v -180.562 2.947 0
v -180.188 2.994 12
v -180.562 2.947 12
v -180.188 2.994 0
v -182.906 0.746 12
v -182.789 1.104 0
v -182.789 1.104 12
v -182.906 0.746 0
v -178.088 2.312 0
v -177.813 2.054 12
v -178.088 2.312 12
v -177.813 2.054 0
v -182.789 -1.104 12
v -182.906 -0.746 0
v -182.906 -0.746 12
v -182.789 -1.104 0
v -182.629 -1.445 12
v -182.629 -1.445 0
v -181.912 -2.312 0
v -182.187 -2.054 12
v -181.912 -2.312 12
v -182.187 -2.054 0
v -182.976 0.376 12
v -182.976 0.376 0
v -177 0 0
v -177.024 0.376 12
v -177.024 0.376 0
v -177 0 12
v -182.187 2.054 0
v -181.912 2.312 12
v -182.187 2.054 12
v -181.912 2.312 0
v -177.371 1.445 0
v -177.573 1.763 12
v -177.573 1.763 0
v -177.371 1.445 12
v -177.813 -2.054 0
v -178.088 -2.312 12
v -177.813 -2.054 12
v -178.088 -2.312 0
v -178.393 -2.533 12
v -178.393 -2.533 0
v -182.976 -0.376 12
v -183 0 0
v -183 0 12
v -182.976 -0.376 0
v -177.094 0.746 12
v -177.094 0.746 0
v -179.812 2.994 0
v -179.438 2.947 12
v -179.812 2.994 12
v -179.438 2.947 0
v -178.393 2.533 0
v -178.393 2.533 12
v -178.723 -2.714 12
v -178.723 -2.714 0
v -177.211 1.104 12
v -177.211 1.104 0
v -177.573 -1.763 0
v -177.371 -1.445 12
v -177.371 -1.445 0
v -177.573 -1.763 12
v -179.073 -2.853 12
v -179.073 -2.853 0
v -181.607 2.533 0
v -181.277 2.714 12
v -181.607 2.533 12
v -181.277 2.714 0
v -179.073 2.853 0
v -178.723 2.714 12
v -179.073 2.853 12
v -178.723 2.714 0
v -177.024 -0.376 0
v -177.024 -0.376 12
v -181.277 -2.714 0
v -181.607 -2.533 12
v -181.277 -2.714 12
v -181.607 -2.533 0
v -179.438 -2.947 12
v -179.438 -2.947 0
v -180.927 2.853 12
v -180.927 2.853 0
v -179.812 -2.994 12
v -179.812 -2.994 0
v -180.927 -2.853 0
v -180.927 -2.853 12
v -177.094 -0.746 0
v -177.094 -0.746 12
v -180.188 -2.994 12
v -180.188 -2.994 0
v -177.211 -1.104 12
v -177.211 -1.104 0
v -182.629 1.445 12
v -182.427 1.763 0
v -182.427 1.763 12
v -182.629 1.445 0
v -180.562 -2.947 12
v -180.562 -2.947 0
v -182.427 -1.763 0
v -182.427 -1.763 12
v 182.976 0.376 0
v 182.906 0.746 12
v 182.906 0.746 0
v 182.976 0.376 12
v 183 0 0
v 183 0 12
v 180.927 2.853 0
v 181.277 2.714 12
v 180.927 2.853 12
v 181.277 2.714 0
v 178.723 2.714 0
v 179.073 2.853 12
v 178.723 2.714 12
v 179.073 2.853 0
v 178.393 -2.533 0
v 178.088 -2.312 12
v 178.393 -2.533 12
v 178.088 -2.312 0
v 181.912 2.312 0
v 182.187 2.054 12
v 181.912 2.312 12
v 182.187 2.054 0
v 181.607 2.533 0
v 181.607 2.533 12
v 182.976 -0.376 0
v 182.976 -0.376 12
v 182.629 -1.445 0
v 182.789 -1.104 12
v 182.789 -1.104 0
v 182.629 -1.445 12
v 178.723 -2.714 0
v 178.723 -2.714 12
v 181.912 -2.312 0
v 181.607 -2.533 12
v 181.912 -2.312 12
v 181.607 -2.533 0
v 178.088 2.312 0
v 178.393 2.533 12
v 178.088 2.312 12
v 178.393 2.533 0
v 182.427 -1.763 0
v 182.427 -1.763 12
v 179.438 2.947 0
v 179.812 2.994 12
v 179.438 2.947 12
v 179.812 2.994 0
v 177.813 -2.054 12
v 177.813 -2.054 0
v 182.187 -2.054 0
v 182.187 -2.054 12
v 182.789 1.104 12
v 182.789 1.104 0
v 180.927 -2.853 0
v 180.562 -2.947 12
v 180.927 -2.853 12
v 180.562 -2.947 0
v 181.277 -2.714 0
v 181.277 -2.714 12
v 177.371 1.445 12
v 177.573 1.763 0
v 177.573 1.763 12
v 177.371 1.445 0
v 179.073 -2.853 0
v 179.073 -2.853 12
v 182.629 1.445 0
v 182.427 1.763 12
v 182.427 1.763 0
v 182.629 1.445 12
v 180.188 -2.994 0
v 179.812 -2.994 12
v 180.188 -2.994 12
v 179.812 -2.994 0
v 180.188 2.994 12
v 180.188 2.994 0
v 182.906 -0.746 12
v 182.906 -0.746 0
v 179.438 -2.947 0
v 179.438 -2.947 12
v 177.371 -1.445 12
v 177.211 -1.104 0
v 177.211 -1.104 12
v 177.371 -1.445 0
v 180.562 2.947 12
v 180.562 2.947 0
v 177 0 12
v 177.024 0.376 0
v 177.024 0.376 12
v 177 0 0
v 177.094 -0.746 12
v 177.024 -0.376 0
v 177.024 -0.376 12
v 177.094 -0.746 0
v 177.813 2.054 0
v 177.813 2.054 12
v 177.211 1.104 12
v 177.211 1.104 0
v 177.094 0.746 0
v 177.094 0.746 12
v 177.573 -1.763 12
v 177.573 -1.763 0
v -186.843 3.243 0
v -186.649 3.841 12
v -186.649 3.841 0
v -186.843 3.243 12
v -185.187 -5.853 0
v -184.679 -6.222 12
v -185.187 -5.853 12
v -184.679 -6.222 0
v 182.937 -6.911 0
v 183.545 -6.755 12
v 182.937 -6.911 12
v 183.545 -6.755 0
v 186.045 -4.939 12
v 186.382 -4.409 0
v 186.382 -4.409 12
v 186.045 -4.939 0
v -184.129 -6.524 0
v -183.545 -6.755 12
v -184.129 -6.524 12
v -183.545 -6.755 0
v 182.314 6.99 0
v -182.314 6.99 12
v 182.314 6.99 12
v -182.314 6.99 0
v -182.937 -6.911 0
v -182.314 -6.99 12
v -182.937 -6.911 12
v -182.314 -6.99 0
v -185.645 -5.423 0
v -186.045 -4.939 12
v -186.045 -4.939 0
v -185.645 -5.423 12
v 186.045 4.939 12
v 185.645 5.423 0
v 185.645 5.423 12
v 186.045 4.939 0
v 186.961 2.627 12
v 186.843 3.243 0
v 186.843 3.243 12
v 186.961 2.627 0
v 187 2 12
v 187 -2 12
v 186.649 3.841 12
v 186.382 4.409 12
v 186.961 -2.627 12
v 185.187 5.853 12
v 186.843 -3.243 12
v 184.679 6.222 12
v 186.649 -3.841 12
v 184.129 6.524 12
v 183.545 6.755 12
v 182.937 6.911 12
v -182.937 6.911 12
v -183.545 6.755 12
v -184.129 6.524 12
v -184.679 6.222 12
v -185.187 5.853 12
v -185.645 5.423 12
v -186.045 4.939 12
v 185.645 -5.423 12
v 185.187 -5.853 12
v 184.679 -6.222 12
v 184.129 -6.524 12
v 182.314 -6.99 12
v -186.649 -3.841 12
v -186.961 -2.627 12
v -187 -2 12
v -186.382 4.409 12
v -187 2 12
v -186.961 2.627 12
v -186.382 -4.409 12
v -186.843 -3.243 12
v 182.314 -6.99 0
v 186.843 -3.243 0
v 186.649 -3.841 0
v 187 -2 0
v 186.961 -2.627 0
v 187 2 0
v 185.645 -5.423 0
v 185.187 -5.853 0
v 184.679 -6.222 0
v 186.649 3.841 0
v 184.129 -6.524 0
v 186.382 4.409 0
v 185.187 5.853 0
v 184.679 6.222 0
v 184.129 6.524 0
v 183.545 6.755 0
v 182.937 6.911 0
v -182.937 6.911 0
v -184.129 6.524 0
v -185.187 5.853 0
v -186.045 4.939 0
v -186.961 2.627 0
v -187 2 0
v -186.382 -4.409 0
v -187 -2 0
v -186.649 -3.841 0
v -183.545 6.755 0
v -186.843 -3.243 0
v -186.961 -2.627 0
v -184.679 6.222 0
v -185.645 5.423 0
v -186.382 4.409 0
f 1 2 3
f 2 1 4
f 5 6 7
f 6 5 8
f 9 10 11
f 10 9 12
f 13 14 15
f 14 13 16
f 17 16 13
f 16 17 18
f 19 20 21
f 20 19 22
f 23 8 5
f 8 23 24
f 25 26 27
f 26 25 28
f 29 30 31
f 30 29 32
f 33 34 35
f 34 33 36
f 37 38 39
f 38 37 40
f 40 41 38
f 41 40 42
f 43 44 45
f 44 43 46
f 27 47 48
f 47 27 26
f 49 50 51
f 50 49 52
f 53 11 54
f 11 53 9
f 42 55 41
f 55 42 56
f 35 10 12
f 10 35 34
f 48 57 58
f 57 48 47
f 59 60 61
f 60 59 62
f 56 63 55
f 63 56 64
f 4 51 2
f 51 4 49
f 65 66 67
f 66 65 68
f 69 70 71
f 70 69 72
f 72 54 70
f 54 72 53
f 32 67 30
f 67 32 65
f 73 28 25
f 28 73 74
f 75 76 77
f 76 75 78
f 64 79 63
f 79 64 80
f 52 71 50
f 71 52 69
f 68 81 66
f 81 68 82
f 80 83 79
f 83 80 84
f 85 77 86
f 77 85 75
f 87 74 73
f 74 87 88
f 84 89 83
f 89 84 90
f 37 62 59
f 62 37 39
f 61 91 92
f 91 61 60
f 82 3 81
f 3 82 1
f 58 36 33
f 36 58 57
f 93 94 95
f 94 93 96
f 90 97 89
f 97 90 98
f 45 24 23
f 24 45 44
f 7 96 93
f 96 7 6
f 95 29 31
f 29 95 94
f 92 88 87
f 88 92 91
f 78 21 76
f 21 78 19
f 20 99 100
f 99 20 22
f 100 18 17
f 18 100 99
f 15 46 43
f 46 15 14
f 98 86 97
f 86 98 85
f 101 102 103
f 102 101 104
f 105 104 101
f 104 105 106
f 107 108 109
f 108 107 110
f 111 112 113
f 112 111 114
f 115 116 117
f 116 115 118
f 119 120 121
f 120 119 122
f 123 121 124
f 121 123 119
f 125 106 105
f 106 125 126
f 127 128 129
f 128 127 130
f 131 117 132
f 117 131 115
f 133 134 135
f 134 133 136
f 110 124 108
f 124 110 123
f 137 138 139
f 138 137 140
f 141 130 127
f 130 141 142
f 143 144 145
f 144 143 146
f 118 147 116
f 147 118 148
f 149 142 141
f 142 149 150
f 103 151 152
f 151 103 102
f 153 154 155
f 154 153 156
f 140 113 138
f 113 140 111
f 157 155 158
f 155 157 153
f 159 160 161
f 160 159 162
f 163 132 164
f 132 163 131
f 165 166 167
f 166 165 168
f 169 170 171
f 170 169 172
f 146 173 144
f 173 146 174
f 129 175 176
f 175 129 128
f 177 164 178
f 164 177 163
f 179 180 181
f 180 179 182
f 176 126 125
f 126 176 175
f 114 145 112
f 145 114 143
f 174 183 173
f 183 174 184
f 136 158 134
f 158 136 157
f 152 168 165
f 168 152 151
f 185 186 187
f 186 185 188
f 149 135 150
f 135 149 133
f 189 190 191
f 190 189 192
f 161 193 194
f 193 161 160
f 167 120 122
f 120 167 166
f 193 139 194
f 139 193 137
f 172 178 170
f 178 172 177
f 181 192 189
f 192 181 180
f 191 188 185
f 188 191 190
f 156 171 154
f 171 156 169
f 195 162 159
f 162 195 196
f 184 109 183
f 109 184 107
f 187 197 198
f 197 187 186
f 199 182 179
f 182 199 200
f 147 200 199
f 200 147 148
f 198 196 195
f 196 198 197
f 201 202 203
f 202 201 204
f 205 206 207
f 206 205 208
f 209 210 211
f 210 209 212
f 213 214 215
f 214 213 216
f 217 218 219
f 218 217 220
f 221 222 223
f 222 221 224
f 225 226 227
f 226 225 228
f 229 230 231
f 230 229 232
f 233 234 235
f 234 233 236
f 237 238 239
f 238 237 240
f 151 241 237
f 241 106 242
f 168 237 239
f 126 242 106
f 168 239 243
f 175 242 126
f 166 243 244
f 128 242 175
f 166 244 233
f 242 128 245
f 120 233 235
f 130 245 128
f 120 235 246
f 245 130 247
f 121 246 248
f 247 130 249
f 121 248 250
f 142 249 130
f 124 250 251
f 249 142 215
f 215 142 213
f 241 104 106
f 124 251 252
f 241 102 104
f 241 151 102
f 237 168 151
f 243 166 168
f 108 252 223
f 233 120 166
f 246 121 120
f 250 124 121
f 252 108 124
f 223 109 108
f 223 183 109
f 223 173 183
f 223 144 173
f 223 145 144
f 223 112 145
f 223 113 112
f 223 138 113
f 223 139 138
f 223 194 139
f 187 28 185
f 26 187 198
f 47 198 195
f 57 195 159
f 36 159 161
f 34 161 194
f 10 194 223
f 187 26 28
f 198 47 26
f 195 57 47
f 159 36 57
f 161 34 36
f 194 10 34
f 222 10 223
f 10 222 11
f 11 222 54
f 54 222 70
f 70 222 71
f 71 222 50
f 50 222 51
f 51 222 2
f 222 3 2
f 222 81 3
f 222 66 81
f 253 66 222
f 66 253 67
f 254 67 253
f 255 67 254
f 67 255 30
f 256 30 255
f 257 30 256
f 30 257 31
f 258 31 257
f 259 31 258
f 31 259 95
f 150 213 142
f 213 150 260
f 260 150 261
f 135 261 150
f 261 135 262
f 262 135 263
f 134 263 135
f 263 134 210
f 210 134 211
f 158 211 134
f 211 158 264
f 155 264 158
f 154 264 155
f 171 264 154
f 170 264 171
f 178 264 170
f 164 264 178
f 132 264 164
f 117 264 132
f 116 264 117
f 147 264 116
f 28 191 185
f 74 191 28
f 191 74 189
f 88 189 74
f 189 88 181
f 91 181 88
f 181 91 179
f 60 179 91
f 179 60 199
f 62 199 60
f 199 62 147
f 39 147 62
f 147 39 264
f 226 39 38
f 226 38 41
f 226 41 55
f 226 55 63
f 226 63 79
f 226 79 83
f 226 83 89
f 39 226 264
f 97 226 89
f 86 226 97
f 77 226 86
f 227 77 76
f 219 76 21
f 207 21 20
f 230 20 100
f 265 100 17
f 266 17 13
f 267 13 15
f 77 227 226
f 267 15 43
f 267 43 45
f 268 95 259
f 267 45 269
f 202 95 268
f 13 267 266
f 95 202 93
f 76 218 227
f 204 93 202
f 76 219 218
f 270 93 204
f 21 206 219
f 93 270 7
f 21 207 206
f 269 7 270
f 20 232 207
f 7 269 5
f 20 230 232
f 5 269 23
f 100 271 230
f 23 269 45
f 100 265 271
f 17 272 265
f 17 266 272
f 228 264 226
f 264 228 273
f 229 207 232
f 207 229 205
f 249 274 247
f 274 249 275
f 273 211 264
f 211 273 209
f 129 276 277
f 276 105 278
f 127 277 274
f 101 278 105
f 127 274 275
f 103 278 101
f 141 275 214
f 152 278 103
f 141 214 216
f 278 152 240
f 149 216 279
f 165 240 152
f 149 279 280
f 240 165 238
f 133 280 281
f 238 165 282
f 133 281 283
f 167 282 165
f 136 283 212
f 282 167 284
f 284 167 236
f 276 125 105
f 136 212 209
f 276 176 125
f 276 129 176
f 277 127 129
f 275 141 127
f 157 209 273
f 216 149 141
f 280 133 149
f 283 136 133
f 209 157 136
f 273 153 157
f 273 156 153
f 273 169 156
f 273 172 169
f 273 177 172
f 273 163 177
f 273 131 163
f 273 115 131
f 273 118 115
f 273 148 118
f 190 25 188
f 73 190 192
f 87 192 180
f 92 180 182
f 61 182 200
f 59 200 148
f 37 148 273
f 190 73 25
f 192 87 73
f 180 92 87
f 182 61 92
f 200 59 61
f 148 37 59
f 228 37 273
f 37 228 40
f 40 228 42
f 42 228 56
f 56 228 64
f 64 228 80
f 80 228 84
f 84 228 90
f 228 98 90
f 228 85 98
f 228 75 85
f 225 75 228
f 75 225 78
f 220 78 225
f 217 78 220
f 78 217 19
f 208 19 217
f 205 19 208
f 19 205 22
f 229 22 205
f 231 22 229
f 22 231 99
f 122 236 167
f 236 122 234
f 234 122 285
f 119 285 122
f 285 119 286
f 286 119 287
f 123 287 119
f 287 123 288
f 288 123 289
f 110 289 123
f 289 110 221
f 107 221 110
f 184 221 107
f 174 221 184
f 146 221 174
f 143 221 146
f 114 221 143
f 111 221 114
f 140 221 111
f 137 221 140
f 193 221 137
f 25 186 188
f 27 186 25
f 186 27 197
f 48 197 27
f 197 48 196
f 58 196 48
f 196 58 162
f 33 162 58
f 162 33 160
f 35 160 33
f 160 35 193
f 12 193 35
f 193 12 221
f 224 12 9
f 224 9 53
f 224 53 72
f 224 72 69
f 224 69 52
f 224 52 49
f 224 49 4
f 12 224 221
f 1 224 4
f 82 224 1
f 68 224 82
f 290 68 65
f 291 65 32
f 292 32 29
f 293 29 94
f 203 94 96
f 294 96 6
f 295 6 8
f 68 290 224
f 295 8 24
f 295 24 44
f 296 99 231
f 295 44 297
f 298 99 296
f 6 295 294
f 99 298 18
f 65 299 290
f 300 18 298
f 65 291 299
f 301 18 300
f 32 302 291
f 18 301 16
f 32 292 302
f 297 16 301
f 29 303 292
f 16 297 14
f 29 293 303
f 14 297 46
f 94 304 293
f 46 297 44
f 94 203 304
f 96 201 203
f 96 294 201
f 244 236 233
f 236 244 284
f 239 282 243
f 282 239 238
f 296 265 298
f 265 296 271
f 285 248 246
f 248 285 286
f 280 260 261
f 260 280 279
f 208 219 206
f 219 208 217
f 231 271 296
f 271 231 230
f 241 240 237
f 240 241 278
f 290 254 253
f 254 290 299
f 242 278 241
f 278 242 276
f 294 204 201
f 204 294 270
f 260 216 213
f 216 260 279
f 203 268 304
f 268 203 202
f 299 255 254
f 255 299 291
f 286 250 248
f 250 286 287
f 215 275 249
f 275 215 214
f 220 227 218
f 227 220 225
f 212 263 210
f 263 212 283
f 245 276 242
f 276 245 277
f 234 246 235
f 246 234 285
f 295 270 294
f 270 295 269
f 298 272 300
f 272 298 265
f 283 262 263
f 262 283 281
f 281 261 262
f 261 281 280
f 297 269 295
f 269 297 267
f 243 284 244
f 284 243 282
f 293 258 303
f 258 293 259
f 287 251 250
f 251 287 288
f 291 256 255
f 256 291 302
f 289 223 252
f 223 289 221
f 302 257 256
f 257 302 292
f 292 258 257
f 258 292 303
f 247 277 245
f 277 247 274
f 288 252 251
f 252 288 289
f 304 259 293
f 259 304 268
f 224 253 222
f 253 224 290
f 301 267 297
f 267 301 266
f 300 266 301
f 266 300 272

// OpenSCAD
$fn = 50;


difference() {
	union() {
		hull() {
			translate(v = [-182.0000000000, 2.0000000000, 0]) {
				cylinder(h = 12, r = 5);
			}
			translate(v = [182.0000000000, 2.0000000000, 0]) {
				cylinder(h = 12, r = 5);
			}
			translate(v = [-182.0000000000, -2.0000000000, 0]) {
				cylinder(h = 12, r = 5);
			}
			translate(v = [182.0000000000, -2.0000000000, 0]) {
				cylinder(h = 12, r = 5);
			}
		}
	}
	union() {
		translate(v = [-180.0000000000, 0.0000000000, -100.0000000000]) {
			cylinder(h = 200, r = 3.0000000000);
		}
		translate(v = [-180.0000000000, 0.0000000000, -100.0000000000]) {
			cylinder(h = 200, r = 3.0000000000);
		}
		translate(v = [180.0000000000, 0.0000000000, -100.0000000000]) {
			cylinder(h = 200, r = 3.0000000000);
		}
		translate(v = [180.0000000000, 0.0000000000, -100.0000000000]) {
			cylinder(h = 200, r = 3.0000000000);
		}
	}
}
